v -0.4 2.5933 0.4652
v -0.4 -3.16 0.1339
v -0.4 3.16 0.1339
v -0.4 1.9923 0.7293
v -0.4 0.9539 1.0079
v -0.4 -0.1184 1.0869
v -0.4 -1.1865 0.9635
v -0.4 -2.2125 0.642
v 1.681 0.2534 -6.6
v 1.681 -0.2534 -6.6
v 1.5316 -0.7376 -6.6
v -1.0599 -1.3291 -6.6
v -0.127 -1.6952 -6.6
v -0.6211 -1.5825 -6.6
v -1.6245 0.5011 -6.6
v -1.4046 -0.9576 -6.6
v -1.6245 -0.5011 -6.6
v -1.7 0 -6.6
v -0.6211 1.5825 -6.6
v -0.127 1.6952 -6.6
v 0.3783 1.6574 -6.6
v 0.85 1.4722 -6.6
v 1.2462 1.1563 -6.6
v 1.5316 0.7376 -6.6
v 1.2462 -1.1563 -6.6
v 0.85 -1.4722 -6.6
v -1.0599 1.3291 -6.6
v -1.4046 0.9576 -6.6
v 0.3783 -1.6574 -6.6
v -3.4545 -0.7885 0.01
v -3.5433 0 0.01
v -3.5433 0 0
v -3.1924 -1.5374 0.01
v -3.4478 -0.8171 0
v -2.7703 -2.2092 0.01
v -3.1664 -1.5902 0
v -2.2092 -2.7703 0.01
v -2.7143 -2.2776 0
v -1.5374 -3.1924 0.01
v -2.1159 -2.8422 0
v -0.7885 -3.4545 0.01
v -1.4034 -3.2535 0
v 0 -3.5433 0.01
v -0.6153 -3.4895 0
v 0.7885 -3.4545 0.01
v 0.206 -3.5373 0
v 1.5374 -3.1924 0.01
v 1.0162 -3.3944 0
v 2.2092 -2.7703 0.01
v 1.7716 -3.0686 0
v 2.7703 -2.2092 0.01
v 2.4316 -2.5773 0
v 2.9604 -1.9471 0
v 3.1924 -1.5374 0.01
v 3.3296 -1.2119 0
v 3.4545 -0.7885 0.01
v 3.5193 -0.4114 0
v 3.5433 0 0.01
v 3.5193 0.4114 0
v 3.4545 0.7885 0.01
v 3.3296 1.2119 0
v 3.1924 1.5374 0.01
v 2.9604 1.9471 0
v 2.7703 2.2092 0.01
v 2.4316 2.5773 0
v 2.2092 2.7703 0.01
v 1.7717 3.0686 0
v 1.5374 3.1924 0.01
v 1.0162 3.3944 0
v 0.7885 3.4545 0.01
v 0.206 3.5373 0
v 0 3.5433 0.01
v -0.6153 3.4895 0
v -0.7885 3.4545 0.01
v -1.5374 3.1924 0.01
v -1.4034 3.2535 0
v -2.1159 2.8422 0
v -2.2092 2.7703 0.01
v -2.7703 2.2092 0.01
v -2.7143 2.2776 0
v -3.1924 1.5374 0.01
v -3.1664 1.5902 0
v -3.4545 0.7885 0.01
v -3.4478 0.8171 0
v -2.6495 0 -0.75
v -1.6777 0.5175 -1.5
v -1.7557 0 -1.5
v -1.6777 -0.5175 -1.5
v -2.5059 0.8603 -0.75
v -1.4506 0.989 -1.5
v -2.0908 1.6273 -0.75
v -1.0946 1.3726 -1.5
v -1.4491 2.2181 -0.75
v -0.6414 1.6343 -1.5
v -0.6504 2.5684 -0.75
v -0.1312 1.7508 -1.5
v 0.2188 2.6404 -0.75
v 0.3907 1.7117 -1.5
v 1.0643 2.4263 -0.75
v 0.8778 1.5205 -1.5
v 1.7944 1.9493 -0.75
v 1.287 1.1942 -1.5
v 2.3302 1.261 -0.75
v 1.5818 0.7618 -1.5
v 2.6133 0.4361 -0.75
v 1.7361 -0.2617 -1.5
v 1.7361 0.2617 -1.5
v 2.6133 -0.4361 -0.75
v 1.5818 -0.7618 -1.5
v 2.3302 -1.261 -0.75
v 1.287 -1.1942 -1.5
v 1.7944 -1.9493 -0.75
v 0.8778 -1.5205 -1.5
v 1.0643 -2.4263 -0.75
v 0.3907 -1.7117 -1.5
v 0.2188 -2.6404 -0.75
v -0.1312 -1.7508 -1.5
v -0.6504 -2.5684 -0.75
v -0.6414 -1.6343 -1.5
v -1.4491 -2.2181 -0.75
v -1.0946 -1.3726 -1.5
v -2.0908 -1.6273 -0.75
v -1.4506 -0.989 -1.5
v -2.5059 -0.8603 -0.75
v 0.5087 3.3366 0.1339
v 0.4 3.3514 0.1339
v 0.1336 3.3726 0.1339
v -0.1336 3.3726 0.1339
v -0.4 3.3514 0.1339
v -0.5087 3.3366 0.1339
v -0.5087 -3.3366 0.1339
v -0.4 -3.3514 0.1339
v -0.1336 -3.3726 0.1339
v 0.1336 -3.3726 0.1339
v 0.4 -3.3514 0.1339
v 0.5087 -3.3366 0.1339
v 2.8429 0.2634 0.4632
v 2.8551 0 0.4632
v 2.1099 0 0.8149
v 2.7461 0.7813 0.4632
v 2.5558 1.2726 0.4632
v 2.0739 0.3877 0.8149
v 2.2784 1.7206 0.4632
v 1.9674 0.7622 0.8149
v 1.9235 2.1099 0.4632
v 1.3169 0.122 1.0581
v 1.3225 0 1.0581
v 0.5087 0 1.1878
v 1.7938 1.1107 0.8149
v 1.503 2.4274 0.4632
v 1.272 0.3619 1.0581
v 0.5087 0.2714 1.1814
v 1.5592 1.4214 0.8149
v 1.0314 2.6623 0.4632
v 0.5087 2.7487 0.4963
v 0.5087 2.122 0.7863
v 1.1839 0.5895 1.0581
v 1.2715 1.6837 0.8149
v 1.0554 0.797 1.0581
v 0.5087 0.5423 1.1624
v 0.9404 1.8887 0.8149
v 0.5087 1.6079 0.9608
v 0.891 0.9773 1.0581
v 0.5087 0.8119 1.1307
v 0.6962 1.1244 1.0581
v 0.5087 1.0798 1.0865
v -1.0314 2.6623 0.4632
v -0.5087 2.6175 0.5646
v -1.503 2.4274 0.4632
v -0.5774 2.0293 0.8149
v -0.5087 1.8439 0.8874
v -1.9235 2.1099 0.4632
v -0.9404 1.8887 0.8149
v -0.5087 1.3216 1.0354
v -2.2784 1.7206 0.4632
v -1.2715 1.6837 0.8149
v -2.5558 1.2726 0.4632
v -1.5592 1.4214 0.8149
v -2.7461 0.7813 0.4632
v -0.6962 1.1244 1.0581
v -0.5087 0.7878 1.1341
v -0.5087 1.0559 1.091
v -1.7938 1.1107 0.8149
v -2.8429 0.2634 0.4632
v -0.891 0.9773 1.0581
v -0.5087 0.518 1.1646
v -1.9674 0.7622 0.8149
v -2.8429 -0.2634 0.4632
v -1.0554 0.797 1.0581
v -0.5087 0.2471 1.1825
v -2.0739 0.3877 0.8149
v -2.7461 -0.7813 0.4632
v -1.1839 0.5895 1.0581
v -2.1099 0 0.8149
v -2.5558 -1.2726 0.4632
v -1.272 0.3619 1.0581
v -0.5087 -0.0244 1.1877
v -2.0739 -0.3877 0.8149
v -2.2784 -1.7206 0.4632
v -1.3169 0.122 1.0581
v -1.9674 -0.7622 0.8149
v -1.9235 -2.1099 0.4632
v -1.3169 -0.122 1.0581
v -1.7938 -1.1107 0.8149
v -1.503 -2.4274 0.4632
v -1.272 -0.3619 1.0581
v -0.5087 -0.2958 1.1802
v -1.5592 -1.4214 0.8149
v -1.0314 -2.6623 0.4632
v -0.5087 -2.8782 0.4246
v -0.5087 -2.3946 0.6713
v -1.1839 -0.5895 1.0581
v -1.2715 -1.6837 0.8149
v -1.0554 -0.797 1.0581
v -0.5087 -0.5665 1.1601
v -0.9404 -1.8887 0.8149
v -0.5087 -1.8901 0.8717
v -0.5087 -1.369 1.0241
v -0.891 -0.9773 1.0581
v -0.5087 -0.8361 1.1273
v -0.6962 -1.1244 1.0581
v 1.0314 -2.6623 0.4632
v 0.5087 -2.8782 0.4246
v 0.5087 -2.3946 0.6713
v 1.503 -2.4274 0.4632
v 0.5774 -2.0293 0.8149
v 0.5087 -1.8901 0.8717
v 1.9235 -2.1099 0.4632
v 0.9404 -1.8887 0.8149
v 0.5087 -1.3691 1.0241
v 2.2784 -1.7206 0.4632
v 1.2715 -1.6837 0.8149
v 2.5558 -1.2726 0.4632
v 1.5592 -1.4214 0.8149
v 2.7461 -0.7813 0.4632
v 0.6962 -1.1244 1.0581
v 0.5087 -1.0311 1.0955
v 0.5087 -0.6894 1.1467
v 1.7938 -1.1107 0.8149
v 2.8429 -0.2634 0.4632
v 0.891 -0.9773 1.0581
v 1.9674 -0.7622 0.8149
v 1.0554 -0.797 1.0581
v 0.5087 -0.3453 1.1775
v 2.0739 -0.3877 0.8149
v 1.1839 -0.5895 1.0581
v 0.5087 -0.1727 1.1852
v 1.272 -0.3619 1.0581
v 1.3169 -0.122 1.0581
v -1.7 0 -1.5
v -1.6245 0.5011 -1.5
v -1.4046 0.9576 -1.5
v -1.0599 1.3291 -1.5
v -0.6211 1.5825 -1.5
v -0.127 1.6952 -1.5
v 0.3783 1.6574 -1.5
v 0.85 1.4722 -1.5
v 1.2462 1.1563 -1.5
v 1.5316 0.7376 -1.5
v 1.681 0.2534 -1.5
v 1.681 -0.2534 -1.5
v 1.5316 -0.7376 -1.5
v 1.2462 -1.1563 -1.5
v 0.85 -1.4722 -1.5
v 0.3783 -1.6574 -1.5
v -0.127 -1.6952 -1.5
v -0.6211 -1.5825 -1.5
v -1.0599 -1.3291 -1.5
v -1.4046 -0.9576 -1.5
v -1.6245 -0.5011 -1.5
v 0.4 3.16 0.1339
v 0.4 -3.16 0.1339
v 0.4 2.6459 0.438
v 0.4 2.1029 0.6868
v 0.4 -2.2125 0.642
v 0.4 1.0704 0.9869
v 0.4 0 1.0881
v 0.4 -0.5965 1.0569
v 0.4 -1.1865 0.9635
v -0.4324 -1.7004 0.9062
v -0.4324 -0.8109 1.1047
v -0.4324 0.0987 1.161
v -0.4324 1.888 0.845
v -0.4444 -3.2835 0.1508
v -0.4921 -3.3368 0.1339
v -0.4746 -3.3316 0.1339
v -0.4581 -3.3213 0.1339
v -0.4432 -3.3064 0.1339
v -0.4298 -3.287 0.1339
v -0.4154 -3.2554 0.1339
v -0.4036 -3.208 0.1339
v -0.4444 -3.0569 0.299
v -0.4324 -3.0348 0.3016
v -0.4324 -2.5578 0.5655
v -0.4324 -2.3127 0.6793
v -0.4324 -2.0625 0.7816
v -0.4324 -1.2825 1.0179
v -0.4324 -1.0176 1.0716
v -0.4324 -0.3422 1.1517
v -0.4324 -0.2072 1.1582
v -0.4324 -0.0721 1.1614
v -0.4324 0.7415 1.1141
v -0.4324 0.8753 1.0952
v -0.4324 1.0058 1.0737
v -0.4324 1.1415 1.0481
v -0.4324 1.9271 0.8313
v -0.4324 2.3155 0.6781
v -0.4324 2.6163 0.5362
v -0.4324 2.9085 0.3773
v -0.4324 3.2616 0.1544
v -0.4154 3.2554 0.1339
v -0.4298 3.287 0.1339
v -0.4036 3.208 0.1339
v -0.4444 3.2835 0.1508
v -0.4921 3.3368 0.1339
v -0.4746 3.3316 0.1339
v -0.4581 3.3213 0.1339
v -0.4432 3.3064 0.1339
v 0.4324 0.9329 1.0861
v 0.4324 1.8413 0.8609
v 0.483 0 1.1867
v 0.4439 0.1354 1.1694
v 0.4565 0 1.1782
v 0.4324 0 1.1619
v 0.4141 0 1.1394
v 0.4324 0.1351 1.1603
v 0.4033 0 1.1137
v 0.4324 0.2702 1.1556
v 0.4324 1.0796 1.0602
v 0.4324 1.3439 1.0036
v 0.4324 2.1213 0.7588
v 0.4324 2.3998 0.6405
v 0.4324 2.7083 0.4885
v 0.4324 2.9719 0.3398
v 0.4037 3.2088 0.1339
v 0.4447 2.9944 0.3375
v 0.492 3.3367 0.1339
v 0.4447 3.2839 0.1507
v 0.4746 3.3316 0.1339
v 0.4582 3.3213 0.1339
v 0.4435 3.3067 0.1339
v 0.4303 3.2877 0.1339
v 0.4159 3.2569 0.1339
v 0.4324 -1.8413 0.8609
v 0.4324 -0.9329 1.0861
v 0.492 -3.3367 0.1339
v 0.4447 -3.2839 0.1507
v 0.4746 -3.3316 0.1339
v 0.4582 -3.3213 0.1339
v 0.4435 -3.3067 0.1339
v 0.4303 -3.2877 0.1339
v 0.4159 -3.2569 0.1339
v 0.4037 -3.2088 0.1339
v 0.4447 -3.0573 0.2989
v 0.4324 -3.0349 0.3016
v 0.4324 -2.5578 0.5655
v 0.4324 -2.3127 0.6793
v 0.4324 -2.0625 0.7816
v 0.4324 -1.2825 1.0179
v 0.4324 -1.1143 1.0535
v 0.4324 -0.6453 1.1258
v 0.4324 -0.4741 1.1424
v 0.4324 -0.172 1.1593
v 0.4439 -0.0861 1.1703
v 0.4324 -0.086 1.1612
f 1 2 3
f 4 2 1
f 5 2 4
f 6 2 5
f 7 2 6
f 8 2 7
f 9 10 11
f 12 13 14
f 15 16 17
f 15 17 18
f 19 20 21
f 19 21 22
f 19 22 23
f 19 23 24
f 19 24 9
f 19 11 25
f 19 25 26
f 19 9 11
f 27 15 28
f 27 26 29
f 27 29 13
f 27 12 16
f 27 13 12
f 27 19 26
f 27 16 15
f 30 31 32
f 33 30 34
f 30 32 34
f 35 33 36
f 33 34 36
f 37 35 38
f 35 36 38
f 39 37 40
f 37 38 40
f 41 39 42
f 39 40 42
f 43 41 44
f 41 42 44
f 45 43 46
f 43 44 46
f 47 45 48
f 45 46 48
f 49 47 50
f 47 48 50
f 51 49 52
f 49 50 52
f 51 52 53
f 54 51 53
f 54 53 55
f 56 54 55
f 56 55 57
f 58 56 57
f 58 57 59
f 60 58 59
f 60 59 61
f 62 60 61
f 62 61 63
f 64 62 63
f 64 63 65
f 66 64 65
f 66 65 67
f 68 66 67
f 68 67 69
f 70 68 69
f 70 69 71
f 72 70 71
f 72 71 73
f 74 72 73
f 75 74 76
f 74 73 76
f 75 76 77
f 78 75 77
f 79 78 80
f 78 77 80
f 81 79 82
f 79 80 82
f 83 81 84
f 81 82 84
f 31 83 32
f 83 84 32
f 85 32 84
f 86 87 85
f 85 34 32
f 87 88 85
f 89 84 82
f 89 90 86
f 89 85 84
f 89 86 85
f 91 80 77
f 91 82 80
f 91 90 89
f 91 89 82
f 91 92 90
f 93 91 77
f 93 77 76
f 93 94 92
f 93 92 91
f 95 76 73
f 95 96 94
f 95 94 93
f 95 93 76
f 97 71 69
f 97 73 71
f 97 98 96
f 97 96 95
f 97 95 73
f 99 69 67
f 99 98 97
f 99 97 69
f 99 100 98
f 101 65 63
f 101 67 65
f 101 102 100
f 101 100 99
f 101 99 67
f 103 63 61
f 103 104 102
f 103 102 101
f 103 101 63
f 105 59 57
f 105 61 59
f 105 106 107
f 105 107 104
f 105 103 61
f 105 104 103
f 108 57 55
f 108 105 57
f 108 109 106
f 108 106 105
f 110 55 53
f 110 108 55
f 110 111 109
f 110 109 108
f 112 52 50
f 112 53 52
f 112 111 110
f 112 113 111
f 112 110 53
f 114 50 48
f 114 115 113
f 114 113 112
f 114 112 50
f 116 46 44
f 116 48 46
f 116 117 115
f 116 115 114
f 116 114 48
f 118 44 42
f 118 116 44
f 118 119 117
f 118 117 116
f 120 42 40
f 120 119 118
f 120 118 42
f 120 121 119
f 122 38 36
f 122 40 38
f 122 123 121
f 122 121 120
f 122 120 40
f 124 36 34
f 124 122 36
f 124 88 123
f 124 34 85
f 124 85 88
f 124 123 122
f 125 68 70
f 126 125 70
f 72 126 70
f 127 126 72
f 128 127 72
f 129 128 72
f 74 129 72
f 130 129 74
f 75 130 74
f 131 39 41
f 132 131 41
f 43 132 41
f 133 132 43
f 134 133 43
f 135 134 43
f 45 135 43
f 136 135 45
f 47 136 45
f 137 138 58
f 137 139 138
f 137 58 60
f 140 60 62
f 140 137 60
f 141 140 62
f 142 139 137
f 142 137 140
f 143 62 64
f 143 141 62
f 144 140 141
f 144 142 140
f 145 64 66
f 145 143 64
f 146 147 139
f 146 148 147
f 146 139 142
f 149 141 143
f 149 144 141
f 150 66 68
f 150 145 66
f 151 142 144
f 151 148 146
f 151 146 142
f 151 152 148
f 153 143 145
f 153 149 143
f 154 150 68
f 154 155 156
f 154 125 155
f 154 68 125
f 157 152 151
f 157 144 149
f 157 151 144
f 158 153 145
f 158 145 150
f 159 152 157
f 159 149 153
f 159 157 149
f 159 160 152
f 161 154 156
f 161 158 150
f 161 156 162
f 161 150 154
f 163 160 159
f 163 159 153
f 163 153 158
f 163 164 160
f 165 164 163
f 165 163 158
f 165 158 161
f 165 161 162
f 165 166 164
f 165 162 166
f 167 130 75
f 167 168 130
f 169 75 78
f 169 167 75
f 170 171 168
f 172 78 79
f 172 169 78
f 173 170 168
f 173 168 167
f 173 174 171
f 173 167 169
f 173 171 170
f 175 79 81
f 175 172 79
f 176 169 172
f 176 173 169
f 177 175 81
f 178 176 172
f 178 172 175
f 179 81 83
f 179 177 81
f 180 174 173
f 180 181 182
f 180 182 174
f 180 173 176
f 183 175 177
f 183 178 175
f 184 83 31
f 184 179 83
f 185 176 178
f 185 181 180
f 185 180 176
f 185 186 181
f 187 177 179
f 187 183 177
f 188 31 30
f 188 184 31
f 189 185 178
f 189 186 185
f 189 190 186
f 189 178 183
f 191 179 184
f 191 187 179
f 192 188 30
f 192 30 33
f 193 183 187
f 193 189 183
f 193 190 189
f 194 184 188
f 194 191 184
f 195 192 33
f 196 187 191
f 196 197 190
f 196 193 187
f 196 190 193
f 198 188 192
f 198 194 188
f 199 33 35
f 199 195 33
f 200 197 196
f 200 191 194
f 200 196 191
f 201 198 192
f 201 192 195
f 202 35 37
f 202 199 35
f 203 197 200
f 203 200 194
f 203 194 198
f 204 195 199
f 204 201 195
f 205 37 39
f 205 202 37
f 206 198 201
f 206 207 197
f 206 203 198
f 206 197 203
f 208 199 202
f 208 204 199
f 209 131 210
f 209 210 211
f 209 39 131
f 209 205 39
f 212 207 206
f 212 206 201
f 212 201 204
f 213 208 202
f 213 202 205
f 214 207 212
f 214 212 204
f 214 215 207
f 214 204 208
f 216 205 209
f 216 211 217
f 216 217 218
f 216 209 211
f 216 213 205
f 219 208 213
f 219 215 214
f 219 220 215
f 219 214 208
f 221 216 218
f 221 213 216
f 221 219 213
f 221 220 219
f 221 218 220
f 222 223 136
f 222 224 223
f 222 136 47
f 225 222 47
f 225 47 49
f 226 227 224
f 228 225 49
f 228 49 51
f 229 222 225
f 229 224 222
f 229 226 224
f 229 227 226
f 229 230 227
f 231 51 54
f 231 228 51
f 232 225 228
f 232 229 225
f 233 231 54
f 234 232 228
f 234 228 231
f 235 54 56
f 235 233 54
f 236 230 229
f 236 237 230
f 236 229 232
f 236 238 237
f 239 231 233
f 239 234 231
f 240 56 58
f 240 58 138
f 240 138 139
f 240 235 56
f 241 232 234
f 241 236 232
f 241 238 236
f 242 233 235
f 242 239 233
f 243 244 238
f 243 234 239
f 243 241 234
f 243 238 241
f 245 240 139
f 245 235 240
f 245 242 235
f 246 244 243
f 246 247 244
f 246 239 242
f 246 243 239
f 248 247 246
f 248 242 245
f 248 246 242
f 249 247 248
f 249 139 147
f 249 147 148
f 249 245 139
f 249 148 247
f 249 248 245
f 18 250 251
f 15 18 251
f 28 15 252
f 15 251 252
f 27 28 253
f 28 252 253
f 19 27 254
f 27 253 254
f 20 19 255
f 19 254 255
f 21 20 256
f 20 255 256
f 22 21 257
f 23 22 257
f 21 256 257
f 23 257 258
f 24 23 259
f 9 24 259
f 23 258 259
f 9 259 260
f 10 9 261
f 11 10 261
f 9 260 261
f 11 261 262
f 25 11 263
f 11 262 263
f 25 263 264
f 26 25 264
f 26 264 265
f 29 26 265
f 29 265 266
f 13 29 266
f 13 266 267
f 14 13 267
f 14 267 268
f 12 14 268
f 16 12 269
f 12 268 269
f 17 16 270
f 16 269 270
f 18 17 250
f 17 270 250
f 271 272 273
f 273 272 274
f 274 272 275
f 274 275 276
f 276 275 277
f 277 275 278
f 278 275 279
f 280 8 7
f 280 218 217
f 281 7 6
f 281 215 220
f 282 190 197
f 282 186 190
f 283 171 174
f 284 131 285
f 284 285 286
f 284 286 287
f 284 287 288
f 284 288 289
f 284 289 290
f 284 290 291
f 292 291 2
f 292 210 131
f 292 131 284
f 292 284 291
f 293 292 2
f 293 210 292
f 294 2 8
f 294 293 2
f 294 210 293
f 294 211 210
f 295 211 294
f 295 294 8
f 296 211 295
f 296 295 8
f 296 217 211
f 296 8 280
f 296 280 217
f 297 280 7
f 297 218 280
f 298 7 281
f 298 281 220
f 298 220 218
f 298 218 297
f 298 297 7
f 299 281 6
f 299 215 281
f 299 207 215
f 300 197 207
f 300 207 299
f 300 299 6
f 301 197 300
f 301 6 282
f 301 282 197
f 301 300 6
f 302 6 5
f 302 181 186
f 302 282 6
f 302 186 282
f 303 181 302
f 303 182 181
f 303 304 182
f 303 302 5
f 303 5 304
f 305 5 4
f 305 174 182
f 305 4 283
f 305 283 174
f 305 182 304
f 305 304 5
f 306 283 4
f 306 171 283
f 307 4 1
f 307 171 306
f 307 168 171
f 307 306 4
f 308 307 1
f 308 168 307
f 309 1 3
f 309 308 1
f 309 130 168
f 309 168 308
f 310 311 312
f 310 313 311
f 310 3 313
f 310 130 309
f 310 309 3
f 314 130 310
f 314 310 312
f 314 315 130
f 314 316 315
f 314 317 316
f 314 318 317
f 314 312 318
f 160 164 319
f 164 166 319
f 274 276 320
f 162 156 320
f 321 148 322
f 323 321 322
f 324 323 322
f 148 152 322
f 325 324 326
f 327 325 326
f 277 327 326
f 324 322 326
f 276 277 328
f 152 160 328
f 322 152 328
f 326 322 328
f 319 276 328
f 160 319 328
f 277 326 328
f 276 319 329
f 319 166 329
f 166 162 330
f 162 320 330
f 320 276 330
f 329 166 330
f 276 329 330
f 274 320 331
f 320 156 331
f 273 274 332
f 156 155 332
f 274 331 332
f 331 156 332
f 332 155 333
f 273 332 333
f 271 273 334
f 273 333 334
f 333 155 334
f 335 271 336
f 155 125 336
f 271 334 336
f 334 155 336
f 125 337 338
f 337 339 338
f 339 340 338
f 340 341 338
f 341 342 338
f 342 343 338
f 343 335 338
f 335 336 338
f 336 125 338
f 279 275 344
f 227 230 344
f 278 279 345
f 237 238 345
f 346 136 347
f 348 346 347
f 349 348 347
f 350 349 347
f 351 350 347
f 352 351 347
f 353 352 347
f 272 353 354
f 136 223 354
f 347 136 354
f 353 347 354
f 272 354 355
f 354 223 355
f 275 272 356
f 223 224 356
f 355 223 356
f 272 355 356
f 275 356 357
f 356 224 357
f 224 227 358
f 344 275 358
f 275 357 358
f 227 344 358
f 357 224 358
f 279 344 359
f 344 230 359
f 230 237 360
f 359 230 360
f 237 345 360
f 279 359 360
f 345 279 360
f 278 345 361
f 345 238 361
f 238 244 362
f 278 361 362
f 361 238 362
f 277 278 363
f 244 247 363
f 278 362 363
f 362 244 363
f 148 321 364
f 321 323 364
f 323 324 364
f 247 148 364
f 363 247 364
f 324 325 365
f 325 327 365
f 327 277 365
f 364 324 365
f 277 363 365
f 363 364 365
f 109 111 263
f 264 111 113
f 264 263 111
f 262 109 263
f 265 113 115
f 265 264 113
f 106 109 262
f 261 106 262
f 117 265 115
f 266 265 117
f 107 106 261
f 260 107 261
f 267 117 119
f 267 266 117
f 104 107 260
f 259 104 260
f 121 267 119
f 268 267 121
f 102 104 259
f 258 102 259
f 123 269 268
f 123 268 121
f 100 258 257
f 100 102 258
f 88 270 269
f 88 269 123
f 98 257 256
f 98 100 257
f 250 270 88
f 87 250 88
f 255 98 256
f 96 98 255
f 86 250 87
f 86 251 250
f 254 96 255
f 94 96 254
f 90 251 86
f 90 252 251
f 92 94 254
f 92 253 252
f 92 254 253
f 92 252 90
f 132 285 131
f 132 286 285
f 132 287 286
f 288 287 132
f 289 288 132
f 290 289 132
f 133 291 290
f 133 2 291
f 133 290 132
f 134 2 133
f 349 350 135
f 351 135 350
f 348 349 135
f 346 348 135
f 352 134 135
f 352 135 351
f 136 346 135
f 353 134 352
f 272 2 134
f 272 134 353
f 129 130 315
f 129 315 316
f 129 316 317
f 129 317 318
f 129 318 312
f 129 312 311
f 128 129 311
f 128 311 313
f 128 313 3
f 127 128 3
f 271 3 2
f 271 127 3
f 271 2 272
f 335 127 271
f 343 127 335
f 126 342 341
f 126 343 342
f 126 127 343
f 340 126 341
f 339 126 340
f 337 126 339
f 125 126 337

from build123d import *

# Parameters (mm, degrees)
SKETCH1_R           = 3.5433
BOSS_EXTRUDE1_DEPTH = 0.01
DOME1_FACE_RADIUS   = 3.5433
DOME1_HEIGHT        = 1.2
SKETCH2_R           = 3.5433
BOSS_EXTRUDE2_DEPTH = 1.5
BOSS_EXTRUDE2_TAPER = 50
SKETCH3_R           = 1.7
BOSS_EXTRUDE3_DEPTH = 5.1
SKETCH4_W           = 0.8
SKETCH4_H           = 7.6
CUT_EXTRUDE1_DEPTH  = 3
FILLET3_R           = 0.1


with BuildPart() as part:
    # Sketch1 → Boss-Extrude1 (new body)
    with BuildSketch(Plane.XY):
        with Locations(Location((0, 0, 0), (0, 0, 180))):
            Circle(SKETCH1_R)
    extrude(amount=BOSS_EXTRUDE1_DEPTH)

    # Dome1: a dome of height H over a round flat face of radius A is a cap of a sphere of radius (A * A + H * H) / (2 * H)
    dome1_r = (DOME1_FACE_RADIUS * DOME1_FACE_RADIUS + DOME1_HEIGHT * DOME1_HEIGHT) / (2 * DOME1_HEIGHT)
    dome1_base = Plane((0, 0, 0.01), z_dir=(0, 0, 1))
    with Locations(dome1_base.offset(DOME1_HEIGHT - dome1_r)):
        dome1_ball = Sphere(dome1_r, mode=Mode.PRIVATE)
    add(split(dome1_ball, bisect_by=dome1_base, keep=Keep.TOP, mode=Mode.PRIVATE))

    # Sketch2 → Boss-Extrude2 (add)
    with BuildSketch(Plane(origin=(0, 0, 0), x_dir=(-1, 0, 0), z_dir=(0, 0, -1))):
        Circle(SKETCH2_R)
    extrude(amount=BOSS_EXTRUDE2_DEPTH, taper=BOSS_EXTRUDE2_TAPER)

    # Sketch3 → Boss-Extrude3 (add)
    with BuildSketch(Plane(origin=(0, 0, -1.5), x_dir=(-1, 0, 0), z_dir=(0, 0, -1))):
        Circle(SKETCH3_R)
    extrude(amount=BOSS_EXTRUDE3_DEPTH)

    # Sketch4 → Cut-Extrude1 (cut)
    with BuildSketch(Plane.XY.offset(0.133904)):
        Rectangle(SKETCH4_W, SKETCH4_H)
    extrude(amount=CUT_EXTRUDE1_DEPTH, mode=Mode.SUBTRACT)

    # Fillet3
    fillet3_edges = [part.edges().sort_by_distance(p)[0] for p in [
        (0.4, -1.757880439, 0.924318226),
        (-0.4, 0, 1.196264613),
    ]]
    fillet(fillet3_edges, radius=FILLET3_R)


solid = part.part
